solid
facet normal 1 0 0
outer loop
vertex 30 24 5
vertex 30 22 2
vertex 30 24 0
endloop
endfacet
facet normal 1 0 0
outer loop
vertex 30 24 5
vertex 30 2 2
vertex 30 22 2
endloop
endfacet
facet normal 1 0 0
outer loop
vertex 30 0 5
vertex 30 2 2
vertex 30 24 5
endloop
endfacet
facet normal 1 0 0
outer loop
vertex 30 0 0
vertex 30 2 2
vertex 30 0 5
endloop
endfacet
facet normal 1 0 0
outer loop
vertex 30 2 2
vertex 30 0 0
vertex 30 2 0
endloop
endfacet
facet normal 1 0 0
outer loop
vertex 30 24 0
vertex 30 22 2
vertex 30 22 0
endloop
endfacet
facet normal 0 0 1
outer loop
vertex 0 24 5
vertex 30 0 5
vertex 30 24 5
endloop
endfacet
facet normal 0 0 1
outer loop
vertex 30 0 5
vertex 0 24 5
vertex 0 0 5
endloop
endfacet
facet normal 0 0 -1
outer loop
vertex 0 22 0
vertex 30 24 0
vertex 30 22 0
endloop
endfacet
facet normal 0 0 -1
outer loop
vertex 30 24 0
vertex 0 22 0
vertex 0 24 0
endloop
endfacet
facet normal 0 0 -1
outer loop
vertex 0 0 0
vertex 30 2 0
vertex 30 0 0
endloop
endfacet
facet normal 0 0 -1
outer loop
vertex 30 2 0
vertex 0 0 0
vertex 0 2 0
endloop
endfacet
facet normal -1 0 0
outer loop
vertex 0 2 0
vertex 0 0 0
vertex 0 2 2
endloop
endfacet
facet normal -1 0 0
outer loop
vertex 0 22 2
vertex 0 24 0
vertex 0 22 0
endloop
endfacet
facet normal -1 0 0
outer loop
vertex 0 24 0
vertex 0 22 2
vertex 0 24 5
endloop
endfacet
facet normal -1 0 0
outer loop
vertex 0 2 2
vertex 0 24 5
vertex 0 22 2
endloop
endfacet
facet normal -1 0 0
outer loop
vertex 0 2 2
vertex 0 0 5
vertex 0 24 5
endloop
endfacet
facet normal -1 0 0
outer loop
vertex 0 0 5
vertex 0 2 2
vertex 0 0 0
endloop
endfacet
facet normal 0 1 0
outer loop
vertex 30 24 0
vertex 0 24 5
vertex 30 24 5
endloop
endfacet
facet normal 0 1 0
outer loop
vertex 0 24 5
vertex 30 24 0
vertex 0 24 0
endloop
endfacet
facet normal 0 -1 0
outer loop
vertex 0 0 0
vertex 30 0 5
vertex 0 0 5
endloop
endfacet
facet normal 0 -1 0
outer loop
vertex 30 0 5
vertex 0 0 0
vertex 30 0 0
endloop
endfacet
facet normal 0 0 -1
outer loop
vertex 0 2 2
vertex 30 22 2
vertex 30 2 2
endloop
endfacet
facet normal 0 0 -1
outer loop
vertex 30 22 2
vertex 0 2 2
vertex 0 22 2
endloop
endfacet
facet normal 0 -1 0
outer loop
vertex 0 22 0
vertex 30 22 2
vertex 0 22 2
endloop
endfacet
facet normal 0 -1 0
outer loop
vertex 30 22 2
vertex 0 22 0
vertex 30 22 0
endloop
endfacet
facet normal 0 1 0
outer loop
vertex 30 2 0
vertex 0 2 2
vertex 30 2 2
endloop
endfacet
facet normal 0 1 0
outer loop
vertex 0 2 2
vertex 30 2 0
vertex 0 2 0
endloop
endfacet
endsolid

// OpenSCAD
// Original MechIntel educational model. CC0-1.0. Units: mm.
// Not a standardized or load-rated component.
$fn=96;
length=30;
strap_width=20;
wall=2;
gap=2;
roof=3;
$fn=64;
difference(){
 union(){
  translate([0,0,0]) cube([length,strap_width+2*wall,gap+roof]);
 }
 translate([-1,wall,-1]) cube([length+2,strap_width,gap+1]);
}
